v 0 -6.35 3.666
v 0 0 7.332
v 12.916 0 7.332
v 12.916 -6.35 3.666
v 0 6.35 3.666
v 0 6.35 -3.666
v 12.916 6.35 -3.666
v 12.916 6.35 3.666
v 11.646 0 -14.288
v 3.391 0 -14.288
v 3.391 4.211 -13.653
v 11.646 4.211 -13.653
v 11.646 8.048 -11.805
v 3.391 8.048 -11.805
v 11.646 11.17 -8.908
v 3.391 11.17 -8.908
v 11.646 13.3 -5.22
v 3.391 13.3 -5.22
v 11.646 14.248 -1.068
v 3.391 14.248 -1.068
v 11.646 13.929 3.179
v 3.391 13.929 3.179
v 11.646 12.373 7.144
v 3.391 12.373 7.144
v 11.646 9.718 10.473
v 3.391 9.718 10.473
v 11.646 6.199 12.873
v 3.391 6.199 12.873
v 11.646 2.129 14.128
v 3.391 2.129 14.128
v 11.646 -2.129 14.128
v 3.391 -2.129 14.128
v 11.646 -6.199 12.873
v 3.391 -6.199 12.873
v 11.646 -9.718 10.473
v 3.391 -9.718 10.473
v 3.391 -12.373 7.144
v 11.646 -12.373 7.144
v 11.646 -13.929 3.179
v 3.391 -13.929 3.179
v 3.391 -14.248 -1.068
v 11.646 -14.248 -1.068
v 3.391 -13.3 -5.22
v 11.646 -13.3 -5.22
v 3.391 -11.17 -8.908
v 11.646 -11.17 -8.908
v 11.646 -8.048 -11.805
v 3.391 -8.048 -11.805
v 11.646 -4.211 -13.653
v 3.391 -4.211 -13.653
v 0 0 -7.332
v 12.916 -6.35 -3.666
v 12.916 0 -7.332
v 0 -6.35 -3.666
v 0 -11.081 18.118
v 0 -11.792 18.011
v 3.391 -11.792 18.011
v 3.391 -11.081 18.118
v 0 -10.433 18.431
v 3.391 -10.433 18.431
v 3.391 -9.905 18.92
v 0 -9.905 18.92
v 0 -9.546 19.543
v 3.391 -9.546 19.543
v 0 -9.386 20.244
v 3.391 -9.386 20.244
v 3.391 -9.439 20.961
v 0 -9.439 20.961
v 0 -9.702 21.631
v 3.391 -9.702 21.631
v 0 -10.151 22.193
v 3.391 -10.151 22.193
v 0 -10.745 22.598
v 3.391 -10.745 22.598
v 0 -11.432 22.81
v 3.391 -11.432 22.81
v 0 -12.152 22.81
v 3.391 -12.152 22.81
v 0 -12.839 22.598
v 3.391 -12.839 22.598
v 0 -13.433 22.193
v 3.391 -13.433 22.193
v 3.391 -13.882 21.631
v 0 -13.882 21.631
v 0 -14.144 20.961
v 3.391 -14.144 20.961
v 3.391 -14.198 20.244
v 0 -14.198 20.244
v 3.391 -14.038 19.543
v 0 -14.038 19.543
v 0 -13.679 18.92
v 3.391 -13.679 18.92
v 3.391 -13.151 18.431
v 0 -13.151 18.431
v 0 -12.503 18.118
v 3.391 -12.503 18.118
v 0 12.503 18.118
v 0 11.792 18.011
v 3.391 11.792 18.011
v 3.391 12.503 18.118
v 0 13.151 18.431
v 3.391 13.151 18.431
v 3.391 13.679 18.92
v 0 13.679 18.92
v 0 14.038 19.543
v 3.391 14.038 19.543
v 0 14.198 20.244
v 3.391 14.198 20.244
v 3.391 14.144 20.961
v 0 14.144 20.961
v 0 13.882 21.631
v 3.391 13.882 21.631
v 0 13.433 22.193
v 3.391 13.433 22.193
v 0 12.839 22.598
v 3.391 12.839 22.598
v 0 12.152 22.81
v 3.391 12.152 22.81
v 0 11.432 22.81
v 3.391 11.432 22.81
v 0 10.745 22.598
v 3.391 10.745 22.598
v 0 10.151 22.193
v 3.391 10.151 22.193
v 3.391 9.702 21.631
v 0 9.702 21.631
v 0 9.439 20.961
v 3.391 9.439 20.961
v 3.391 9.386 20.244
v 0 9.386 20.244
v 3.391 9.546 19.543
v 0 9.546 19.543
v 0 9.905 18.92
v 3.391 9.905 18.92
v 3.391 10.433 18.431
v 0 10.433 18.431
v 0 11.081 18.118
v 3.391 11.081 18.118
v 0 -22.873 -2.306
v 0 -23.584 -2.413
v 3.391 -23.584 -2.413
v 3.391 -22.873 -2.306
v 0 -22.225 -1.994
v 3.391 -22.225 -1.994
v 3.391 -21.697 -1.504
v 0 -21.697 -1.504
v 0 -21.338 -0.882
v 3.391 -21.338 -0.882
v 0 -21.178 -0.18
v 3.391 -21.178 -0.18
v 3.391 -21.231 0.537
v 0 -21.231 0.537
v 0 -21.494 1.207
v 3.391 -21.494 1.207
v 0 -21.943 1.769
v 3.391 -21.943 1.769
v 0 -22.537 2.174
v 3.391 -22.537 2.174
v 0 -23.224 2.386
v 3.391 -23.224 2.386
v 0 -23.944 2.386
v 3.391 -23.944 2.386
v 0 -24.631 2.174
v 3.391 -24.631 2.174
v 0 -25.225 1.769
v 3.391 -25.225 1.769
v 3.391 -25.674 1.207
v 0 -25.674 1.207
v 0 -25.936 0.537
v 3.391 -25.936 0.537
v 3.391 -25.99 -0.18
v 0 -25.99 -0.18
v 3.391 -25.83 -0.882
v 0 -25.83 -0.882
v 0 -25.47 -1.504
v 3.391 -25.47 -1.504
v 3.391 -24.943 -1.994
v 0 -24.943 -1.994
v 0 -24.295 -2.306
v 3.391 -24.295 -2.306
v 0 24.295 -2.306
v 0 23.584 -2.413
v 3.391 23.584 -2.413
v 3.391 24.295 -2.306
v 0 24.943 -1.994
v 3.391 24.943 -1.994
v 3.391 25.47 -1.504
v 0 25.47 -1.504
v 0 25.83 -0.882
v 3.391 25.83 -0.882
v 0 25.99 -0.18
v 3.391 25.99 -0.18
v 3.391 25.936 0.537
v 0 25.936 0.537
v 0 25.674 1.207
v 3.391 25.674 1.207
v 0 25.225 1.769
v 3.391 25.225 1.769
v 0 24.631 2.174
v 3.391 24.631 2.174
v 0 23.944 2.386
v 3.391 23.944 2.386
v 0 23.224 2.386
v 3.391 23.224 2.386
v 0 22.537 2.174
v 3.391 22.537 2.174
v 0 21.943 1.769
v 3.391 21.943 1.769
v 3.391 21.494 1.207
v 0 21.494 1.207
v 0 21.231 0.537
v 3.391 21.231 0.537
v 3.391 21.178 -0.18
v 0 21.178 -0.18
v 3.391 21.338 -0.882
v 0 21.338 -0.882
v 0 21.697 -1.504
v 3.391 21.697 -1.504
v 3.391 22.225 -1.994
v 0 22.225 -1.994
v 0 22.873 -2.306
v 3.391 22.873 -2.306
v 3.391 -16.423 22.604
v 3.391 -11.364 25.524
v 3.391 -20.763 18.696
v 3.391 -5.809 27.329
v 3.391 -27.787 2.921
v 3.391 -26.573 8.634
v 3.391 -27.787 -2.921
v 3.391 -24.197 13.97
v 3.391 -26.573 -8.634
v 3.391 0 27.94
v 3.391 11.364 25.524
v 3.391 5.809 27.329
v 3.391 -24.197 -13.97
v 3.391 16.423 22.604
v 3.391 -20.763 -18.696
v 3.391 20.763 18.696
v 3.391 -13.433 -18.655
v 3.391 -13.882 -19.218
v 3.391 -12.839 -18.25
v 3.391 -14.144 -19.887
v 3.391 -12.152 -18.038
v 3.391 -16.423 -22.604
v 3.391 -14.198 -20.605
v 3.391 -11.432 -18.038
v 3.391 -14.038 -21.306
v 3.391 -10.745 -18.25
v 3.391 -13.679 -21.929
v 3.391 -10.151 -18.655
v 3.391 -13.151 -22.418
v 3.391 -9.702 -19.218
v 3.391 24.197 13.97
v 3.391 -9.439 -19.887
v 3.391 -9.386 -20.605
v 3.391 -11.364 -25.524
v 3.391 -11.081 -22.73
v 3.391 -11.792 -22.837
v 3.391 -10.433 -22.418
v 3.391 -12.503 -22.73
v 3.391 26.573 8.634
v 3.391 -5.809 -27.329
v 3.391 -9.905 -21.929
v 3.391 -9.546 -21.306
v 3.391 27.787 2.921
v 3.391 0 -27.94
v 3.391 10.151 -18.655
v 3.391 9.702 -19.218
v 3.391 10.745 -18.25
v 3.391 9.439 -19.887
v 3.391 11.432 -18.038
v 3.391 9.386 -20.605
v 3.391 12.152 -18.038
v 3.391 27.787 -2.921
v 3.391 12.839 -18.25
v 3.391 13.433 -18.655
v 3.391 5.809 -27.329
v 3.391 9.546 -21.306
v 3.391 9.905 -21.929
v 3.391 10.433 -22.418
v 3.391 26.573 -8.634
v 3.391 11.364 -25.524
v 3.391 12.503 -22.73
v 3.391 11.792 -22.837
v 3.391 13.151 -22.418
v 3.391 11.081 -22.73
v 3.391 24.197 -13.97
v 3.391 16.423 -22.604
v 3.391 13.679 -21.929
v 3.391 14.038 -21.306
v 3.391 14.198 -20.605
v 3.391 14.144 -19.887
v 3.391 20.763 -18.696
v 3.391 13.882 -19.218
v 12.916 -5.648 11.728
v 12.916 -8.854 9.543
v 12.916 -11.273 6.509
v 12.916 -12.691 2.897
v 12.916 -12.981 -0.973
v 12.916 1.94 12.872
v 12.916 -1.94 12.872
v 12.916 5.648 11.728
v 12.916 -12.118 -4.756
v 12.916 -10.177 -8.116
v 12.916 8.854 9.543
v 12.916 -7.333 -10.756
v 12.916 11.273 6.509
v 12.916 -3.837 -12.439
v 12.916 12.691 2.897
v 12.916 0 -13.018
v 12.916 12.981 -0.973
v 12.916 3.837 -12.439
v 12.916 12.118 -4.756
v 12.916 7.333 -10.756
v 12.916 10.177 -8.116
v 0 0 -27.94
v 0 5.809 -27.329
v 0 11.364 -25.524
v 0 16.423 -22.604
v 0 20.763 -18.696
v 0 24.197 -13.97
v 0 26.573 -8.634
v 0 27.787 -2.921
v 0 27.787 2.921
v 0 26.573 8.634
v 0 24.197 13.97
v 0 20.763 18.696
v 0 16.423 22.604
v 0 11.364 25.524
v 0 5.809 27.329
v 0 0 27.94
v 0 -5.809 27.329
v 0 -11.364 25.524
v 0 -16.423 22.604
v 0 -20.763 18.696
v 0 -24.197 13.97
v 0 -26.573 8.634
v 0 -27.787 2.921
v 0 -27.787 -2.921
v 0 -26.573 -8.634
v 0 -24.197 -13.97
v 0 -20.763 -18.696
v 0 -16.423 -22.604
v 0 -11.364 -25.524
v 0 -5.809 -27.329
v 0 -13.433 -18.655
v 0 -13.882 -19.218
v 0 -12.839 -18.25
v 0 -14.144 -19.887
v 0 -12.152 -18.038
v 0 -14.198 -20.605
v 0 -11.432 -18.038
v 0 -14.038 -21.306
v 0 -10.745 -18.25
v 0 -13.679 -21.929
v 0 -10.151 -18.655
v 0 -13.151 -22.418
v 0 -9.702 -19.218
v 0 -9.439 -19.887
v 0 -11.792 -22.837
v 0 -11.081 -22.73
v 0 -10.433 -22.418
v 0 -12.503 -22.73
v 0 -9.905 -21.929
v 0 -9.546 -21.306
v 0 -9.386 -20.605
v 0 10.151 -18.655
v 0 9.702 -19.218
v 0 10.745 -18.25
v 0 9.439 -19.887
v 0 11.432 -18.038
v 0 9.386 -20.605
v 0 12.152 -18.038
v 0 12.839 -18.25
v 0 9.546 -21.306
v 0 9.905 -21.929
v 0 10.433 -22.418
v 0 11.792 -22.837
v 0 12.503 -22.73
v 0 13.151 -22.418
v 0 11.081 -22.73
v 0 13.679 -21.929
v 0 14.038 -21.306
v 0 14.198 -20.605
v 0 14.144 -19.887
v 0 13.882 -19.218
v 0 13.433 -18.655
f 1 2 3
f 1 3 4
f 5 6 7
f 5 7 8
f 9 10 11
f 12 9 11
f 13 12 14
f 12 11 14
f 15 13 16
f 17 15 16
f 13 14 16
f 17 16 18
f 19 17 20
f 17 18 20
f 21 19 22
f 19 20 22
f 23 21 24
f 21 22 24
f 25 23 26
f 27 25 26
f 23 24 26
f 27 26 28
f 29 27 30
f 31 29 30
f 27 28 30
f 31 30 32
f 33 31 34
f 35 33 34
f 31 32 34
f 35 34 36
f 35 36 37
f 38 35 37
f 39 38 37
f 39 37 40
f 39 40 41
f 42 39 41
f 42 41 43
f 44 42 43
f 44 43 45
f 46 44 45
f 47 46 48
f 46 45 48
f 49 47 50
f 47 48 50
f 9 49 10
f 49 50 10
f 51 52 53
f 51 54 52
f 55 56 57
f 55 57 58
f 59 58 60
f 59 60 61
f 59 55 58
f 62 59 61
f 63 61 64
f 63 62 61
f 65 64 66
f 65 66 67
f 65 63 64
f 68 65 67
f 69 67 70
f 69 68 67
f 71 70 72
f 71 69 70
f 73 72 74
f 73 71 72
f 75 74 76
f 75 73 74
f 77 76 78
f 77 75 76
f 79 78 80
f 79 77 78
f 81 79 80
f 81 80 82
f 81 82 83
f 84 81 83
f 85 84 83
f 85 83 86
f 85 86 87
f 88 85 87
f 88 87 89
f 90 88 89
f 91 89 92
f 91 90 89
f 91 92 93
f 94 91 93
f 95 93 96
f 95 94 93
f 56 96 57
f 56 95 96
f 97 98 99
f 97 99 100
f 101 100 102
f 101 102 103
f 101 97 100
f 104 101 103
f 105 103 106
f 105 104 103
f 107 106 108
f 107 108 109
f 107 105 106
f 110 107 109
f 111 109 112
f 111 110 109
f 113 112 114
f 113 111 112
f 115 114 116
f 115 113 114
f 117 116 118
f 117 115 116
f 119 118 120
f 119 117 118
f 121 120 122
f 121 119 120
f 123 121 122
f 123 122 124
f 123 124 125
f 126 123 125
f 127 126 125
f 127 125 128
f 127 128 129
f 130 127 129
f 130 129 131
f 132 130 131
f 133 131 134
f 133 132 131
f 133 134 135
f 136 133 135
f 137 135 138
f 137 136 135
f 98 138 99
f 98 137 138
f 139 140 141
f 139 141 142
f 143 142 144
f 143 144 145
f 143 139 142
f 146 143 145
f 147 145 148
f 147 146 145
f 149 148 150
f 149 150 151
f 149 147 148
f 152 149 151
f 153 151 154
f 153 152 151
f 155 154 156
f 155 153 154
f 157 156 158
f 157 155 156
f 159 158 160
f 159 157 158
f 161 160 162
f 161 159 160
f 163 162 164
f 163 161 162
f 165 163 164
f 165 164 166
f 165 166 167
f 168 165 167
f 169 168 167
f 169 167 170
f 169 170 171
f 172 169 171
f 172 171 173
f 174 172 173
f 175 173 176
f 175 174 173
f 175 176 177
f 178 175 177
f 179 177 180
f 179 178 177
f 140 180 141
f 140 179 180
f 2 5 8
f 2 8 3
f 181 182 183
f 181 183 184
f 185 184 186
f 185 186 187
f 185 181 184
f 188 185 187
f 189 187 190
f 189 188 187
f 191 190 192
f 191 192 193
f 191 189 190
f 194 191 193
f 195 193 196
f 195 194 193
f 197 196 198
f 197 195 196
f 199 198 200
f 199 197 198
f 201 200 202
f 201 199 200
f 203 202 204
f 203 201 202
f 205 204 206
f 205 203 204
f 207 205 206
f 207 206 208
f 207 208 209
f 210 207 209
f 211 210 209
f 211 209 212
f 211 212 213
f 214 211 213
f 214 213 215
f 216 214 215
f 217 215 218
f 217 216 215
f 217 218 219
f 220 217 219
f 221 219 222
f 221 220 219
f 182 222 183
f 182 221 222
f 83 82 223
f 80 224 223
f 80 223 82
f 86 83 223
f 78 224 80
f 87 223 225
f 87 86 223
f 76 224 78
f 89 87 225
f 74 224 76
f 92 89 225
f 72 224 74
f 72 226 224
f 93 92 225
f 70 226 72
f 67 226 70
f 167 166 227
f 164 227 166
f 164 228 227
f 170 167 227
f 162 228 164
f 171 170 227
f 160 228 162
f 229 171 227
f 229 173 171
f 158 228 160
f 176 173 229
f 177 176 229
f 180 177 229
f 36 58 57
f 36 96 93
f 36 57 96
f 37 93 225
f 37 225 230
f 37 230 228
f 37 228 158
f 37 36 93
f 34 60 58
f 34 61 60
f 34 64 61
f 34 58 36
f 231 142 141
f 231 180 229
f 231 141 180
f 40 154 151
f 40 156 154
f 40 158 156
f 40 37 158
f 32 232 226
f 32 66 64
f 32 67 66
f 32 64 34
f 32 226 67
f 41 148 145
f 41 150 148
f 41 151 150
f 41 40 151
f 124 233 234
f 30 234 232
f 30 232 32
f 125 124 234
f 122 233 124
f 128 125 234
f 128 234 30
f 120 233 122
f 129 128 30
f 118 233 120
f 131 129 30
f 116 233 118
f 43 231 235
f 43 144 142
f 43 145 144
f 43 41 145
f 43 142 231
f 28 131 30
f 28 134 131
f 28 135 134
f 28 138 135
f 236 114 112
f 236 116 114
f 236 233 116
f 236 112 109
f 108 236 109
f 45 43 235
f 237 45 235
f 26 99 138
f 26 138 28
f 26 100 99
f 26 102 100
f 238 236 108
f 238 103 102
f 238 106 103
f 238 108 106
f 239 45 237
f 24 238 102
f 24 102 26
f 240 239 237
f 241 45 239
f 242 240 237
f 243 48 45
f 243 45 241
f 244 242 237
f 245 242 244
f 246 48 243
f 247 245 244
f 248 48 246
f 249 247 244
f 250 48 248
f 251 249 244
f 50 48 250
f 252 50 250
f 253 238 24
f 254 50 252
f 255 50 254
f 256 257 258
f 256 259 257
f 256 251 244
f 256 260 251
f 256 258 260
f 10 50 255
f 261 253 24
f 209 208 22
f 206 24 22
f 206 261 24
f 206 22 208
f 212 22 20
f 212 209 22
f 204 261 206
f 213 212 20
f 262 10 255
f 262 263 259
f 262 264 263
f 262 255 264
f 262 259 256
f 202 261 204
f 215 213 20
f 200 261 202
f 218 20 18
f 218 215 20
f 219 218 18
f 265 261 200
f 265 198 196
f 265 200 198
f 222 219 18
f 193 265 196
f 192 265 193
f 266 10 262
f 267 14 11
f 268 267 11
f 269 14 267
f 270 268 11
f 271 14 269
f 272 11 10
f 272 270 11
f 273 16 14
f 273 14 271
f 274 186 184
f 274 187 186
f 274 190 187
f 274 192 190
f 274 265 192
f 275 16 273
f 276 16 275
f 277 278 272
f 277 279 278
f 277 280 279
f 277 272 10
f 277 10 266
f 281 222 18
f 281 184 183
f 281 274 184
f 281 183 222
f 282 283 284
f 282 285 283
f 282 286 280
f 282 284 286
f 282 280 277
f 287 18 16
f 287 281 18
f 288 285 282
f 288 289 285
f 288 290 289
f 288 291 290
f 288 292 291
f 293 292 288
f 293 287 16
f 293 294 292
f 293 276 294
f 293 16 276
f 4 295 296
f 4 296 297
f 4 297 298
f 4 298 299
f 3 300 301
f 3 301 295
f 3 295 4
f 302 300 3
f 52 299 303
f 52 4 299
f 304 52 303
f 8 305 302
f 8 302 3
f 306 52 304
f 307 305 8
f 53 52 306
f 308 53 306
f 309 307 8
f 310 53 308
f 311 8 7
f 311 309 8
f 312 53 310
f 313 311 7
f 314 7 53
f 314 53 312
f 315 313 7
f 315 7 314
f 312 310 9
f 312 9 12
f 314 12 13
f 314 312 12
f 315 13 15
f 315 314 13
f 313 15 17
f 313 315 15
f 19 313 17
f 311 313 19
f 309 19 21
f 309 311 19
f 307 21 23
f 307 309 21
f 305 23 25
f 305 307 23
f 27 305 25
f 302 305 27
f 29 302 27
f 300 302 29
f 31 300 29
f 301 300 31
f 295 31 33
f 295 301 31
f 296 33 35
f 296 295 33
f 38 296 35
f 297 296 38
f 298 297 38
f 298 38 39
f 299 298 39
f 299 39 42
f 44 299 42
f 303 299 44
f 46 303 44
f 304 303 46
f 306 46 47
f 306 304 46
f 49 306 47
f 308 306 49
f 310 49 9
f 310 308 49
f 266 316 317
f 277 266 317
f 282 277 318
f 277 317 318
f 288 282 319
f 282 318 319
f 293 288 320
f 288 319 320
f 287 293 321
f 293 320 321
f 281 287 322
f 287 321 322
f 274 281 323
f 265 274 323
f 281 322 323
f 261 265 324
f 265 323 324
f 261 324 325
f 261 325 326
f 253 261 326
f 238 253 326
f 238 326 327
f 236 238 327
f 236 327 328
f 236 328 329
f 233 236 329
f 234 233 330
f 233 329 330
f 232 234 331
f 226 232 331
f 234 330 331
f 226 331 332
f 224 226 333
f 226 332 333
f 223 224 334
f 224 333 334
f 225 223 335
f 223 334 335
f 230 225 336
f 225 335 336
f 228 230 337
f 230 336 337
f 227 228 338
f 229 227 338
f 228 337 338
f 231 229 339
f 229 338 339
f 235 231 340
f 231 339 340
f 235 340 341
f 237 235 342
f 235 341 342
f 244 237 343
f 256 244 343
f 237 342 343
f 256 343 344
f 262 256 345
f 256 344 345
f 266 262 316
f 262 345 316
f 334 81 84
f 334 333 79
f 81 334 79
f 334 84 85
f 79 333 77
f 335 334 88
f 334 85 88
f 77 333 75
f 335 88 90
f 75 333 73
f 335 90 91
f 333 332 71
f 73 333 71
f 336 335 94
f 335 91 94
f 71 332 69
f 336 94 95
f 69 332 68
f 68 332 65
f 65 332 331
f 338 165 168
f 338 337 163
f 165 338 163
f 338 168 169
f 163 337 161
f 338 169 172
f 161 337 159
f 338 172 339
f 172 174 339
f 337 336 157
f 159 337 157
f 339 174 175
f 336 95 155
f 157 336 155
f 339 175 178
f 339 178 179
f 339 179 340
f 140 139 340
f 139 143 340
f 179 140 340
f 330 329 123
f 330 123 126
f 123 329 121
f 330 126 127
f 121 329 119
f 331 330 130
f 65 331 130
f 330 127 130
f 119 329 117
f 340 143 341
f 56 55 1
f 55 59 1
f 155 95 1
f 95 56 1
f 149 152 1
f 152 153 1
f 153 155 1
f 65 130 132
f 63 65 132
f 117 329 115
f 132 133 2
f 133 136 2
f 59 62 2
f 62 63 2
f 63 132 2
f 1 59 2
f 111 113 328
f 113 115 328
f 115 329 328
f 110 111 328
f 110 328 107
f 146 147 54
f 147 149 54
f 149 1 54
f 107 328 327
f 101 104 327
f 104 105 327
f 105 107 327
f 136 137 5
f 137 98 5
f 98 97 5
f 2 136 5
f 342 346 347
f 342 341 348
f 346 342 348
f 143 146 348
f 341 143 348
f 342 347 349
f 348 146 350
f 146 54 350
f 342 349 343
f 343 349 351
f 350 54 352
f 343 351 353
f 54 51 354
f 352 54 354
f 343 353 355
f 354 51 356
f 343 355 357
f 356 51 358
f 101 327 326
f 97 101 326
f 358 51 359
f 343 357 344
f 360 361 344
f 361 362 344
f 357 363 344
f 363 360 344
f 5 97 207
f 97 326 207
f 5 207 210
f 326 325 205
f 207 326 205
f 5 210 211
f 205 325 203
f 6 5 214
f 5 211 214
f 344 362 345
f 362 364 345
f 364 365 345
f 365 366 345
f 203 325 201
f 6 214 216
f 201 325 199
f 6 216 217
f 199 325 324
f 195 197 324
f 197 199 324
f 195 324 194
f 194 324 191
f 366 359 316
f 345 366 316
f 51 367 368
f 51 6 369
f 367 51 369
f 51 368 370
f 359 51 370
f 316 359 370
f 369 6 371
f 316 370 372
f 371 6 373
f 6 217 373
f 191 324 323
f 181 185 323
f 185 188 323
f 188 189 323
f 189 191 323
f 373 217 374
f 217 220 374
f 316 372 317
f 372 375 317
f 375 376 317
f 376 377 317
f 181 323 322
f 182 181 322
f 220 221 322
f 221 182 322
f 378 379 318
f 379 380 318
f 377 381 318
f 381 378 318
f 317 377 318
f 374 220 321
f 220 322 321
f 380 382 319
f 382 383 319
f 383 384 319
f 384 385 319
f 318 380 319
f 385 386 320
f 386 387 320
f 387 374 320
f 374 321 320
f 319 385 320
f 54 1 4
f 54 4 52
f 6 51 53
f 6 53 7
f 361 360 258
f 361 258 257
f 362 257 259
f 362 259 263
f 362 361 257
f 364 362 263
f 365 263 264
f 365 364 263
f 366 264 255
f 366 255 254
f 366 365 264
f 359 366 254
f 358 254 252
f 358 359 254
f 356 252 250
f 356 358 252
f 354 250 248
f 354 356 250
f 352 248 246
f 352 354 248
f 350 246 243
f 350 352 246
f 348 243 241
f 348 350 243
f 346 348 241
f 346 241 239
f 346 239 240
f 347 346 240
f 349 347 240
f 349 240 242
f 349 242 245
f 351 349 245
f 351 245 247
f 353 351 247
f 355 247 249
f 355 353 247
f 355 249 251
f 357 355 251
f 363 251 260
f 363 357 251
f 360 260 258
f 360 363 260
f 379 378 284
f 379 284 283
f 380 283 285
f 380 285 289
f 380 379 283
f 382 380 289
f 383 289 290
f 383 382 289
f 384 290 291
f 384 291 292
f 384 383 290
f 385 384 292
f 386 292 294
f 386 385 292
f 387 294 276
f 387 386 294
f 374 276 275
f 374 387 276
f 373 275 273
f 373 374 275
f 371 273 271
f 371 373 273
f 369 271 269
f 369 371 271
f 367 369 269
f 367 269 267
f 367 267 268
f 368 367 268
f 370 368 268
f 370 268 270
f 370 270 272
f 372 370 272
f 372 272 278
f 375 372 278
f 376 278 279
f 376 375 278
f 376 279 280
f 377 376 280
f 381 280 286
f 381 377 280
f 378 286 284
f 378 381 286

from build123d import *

# Parameters (mm, degrees)
SKETCH1_R           = 27.94
SKETCH1_R_2         = 2.413
BOSS_EXTRUDE1_DEPTH = 3.3909
SKETCH2_R           = 14.2875
BOSS_EXTRUDE2_DEPTH = 9.525
CHAMFER1_SIZE       = 1.27


with BuildPart() as part:
    # Sketch1 → Boss-Extrude1 (new body)
    with BuildSketch(Plane(origin=(0, 0, 0), x_dir=(0, 0, -1), z_dir=(1, 0, 0))):
        Circle(SKETCH1_R)
        with Locations((0, 23.5839)):
            Circle(SKETCH1_R_2, mode=Mode.SUBTRACT)
        with Locations((20.42425652, 11.79195)):
            Circle(SKETCH1_R_2, mode=Mode.SUBTRACT)
        with Locations((20.42425652, -11.79195)):
            Circle(SKETCH1_R_2, mode=Mode.SUBTRACT)
        with Locations((0, -23.5839)):
            Circle(SKETCH1_R_2, mode=Mode.SUBTRACT)
        with Locations((-20.42425652, -11.79195)):
            Circle(SKETCH1_R_2, mode=Mode.SUBTRACT)
        with Locations((-20.42425652, 11.79195)):
            Circle(SKETCH1_R_2, mode=Mode.SUBTRACT)
        Polygon((7.332348419, 0), (3.666174209, 6.35), (-3.666174209, 6.35), (-7.332348419, 0), (-3.666174209, -6.35), (3.666174209, -6.35), align=None, mode=Mode.SUBTRACT)
    extrude(amount=BOSS_EXTRUDE1_DEPTH)

    # Sketch2 → Boss-Extrude2 (add)
    with BuildSketch(Plane(origin=(3.3909, 0, 0), x_dir=(0, 0, -1), z_dir=(1, 0, 0))):
        Circle(SKETCH2_R)
        Polygon((3.666174209, -6.35), (7.332348419, 0), (3.666174209, 6.35), (-3.666174209, 6.35), (-7.332348419, 0), (-3.666174209, -6.35), align=None, mode=Mode.SUBTRACT)
    extrude(amount=BOSS_EXTRUDE2_DEPTH)

    # Chamfer1
    chamfer1_edges = [part.edges().sort_by_distance(p)[0] for p in [
        (12.9159, 0, 14.2875),
    ]]
    chamfer(chamfer1_edges, length=CHAMFER1_SIZE)


solid = part.part
